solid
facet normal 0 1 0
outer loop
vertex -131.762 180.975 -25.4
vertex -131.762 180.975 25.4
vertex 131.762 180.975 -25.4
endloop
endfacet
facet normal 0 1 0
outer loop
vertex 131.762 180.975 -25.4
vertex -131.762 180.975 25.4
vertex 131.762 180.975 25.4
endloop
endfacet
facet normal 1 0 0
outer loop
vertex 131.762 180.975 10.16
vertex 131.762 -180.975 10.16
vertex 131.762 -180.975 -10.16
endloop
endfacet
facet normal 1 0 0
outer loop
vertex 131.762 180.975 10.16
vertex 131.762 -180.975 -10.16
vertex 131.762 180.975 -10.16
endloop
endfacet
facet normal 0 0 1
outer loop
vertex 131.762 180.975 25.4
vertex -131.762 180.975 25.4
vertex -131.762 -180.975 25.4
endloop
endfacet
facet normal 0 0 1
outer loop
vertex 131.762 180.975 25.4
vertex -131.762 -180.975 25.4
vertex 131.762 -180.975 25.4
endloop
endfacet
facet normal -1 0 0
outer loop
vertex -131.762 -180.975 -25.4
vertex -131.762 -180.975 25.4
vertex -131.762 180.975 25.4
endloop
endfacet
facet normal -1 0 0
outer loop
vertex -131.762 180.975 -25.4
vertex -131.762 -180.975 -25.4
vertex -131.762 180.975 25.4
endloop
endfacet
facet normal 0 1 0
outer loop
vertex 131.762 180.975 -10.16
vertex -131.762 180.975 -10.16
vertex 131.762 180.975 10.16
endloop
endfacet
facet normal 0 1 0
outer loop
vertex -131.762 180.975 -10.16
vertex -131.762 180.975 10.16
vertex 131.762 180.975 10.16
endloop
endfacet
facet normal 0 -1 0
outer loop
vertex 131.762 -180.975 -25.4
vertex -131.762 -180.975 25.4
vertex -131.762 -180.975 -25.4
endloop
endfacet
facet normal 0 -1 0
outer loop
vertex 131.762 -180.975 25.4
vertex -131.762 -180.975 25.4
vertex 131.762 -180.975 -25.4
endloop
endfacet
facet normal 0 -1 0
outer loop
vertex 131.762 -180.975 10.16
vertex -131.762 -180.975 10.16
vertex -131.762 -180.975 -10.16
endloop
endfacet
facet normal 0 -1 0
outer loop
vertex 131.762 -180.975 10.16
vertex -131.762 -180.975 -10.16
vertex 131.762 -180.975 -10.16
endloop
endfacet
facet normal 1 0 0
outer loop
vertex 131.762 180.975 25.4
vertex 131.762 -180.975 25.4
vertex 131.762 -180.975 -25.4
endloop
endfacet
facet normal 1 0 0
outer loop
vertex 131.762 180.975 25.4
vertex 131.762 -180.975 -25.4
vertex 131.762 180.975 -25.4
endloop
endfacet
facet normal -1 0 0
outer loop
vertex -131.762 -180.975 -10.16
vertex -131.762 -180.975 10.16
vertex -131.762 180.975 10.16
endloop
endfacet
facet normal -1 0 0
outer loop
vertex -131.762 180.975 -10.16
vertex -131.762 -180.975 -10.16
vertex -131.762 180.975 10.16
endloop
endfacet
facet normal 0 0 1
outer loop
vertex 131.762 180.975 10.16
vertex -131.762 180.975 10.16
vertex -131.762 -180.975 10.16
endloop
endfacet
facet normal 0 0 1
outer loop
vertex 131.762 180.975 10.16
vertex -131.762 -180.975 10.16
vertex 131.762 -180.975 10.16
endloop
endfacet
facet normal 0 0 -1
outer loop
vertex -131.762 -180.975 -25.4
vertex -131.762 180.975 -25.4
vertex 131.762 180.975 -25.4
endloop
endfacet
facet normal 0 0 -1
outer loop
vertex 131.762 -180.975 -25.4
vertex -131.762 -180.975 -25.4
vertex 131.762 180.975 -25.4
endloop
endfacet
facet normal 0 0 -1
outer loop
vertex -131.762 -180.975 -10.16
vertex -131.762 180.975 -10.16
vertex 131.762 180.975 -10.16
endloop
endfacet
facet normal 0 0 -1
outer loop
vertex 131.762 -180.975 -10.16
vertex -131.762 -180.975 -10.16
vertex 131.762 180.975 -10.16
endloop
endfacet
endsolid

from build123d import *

# Parameters (mm, degrees)
F0_W          = 263.525
F0_H          = 361.95
F1_DEPTH      = 10.16
F1_DEPTH_BACK = 10.16
F2_DEPTH      = 25.4
F2_DEPTH_BACK = 25.4


with BuildPart() as f1:
    # F0 (on Top) → F1 (new body, two sides)
    with BuildSketch(Plane.XY) as f1_sk:
        Rectangle(F0_W, F0_H)
    extrude(amount=F1_DEPTH)
    extrude(f1_sk.sketch, amount=-F1_DEPTH_BACK)


with BuildPart() as f2:
    # F0 (on Top) → F2 (new body, two sides)
    with BuildSketch(Plane.XY) as f2_sk:
        Rectangle(F0_W, F0_H)
    extrude(amount=F2_DEPTH)
    extrude(f2_sk.sketch, amount=-F2_DEPTH_BACK)


solid = Compound([f1.part, f2.part])
